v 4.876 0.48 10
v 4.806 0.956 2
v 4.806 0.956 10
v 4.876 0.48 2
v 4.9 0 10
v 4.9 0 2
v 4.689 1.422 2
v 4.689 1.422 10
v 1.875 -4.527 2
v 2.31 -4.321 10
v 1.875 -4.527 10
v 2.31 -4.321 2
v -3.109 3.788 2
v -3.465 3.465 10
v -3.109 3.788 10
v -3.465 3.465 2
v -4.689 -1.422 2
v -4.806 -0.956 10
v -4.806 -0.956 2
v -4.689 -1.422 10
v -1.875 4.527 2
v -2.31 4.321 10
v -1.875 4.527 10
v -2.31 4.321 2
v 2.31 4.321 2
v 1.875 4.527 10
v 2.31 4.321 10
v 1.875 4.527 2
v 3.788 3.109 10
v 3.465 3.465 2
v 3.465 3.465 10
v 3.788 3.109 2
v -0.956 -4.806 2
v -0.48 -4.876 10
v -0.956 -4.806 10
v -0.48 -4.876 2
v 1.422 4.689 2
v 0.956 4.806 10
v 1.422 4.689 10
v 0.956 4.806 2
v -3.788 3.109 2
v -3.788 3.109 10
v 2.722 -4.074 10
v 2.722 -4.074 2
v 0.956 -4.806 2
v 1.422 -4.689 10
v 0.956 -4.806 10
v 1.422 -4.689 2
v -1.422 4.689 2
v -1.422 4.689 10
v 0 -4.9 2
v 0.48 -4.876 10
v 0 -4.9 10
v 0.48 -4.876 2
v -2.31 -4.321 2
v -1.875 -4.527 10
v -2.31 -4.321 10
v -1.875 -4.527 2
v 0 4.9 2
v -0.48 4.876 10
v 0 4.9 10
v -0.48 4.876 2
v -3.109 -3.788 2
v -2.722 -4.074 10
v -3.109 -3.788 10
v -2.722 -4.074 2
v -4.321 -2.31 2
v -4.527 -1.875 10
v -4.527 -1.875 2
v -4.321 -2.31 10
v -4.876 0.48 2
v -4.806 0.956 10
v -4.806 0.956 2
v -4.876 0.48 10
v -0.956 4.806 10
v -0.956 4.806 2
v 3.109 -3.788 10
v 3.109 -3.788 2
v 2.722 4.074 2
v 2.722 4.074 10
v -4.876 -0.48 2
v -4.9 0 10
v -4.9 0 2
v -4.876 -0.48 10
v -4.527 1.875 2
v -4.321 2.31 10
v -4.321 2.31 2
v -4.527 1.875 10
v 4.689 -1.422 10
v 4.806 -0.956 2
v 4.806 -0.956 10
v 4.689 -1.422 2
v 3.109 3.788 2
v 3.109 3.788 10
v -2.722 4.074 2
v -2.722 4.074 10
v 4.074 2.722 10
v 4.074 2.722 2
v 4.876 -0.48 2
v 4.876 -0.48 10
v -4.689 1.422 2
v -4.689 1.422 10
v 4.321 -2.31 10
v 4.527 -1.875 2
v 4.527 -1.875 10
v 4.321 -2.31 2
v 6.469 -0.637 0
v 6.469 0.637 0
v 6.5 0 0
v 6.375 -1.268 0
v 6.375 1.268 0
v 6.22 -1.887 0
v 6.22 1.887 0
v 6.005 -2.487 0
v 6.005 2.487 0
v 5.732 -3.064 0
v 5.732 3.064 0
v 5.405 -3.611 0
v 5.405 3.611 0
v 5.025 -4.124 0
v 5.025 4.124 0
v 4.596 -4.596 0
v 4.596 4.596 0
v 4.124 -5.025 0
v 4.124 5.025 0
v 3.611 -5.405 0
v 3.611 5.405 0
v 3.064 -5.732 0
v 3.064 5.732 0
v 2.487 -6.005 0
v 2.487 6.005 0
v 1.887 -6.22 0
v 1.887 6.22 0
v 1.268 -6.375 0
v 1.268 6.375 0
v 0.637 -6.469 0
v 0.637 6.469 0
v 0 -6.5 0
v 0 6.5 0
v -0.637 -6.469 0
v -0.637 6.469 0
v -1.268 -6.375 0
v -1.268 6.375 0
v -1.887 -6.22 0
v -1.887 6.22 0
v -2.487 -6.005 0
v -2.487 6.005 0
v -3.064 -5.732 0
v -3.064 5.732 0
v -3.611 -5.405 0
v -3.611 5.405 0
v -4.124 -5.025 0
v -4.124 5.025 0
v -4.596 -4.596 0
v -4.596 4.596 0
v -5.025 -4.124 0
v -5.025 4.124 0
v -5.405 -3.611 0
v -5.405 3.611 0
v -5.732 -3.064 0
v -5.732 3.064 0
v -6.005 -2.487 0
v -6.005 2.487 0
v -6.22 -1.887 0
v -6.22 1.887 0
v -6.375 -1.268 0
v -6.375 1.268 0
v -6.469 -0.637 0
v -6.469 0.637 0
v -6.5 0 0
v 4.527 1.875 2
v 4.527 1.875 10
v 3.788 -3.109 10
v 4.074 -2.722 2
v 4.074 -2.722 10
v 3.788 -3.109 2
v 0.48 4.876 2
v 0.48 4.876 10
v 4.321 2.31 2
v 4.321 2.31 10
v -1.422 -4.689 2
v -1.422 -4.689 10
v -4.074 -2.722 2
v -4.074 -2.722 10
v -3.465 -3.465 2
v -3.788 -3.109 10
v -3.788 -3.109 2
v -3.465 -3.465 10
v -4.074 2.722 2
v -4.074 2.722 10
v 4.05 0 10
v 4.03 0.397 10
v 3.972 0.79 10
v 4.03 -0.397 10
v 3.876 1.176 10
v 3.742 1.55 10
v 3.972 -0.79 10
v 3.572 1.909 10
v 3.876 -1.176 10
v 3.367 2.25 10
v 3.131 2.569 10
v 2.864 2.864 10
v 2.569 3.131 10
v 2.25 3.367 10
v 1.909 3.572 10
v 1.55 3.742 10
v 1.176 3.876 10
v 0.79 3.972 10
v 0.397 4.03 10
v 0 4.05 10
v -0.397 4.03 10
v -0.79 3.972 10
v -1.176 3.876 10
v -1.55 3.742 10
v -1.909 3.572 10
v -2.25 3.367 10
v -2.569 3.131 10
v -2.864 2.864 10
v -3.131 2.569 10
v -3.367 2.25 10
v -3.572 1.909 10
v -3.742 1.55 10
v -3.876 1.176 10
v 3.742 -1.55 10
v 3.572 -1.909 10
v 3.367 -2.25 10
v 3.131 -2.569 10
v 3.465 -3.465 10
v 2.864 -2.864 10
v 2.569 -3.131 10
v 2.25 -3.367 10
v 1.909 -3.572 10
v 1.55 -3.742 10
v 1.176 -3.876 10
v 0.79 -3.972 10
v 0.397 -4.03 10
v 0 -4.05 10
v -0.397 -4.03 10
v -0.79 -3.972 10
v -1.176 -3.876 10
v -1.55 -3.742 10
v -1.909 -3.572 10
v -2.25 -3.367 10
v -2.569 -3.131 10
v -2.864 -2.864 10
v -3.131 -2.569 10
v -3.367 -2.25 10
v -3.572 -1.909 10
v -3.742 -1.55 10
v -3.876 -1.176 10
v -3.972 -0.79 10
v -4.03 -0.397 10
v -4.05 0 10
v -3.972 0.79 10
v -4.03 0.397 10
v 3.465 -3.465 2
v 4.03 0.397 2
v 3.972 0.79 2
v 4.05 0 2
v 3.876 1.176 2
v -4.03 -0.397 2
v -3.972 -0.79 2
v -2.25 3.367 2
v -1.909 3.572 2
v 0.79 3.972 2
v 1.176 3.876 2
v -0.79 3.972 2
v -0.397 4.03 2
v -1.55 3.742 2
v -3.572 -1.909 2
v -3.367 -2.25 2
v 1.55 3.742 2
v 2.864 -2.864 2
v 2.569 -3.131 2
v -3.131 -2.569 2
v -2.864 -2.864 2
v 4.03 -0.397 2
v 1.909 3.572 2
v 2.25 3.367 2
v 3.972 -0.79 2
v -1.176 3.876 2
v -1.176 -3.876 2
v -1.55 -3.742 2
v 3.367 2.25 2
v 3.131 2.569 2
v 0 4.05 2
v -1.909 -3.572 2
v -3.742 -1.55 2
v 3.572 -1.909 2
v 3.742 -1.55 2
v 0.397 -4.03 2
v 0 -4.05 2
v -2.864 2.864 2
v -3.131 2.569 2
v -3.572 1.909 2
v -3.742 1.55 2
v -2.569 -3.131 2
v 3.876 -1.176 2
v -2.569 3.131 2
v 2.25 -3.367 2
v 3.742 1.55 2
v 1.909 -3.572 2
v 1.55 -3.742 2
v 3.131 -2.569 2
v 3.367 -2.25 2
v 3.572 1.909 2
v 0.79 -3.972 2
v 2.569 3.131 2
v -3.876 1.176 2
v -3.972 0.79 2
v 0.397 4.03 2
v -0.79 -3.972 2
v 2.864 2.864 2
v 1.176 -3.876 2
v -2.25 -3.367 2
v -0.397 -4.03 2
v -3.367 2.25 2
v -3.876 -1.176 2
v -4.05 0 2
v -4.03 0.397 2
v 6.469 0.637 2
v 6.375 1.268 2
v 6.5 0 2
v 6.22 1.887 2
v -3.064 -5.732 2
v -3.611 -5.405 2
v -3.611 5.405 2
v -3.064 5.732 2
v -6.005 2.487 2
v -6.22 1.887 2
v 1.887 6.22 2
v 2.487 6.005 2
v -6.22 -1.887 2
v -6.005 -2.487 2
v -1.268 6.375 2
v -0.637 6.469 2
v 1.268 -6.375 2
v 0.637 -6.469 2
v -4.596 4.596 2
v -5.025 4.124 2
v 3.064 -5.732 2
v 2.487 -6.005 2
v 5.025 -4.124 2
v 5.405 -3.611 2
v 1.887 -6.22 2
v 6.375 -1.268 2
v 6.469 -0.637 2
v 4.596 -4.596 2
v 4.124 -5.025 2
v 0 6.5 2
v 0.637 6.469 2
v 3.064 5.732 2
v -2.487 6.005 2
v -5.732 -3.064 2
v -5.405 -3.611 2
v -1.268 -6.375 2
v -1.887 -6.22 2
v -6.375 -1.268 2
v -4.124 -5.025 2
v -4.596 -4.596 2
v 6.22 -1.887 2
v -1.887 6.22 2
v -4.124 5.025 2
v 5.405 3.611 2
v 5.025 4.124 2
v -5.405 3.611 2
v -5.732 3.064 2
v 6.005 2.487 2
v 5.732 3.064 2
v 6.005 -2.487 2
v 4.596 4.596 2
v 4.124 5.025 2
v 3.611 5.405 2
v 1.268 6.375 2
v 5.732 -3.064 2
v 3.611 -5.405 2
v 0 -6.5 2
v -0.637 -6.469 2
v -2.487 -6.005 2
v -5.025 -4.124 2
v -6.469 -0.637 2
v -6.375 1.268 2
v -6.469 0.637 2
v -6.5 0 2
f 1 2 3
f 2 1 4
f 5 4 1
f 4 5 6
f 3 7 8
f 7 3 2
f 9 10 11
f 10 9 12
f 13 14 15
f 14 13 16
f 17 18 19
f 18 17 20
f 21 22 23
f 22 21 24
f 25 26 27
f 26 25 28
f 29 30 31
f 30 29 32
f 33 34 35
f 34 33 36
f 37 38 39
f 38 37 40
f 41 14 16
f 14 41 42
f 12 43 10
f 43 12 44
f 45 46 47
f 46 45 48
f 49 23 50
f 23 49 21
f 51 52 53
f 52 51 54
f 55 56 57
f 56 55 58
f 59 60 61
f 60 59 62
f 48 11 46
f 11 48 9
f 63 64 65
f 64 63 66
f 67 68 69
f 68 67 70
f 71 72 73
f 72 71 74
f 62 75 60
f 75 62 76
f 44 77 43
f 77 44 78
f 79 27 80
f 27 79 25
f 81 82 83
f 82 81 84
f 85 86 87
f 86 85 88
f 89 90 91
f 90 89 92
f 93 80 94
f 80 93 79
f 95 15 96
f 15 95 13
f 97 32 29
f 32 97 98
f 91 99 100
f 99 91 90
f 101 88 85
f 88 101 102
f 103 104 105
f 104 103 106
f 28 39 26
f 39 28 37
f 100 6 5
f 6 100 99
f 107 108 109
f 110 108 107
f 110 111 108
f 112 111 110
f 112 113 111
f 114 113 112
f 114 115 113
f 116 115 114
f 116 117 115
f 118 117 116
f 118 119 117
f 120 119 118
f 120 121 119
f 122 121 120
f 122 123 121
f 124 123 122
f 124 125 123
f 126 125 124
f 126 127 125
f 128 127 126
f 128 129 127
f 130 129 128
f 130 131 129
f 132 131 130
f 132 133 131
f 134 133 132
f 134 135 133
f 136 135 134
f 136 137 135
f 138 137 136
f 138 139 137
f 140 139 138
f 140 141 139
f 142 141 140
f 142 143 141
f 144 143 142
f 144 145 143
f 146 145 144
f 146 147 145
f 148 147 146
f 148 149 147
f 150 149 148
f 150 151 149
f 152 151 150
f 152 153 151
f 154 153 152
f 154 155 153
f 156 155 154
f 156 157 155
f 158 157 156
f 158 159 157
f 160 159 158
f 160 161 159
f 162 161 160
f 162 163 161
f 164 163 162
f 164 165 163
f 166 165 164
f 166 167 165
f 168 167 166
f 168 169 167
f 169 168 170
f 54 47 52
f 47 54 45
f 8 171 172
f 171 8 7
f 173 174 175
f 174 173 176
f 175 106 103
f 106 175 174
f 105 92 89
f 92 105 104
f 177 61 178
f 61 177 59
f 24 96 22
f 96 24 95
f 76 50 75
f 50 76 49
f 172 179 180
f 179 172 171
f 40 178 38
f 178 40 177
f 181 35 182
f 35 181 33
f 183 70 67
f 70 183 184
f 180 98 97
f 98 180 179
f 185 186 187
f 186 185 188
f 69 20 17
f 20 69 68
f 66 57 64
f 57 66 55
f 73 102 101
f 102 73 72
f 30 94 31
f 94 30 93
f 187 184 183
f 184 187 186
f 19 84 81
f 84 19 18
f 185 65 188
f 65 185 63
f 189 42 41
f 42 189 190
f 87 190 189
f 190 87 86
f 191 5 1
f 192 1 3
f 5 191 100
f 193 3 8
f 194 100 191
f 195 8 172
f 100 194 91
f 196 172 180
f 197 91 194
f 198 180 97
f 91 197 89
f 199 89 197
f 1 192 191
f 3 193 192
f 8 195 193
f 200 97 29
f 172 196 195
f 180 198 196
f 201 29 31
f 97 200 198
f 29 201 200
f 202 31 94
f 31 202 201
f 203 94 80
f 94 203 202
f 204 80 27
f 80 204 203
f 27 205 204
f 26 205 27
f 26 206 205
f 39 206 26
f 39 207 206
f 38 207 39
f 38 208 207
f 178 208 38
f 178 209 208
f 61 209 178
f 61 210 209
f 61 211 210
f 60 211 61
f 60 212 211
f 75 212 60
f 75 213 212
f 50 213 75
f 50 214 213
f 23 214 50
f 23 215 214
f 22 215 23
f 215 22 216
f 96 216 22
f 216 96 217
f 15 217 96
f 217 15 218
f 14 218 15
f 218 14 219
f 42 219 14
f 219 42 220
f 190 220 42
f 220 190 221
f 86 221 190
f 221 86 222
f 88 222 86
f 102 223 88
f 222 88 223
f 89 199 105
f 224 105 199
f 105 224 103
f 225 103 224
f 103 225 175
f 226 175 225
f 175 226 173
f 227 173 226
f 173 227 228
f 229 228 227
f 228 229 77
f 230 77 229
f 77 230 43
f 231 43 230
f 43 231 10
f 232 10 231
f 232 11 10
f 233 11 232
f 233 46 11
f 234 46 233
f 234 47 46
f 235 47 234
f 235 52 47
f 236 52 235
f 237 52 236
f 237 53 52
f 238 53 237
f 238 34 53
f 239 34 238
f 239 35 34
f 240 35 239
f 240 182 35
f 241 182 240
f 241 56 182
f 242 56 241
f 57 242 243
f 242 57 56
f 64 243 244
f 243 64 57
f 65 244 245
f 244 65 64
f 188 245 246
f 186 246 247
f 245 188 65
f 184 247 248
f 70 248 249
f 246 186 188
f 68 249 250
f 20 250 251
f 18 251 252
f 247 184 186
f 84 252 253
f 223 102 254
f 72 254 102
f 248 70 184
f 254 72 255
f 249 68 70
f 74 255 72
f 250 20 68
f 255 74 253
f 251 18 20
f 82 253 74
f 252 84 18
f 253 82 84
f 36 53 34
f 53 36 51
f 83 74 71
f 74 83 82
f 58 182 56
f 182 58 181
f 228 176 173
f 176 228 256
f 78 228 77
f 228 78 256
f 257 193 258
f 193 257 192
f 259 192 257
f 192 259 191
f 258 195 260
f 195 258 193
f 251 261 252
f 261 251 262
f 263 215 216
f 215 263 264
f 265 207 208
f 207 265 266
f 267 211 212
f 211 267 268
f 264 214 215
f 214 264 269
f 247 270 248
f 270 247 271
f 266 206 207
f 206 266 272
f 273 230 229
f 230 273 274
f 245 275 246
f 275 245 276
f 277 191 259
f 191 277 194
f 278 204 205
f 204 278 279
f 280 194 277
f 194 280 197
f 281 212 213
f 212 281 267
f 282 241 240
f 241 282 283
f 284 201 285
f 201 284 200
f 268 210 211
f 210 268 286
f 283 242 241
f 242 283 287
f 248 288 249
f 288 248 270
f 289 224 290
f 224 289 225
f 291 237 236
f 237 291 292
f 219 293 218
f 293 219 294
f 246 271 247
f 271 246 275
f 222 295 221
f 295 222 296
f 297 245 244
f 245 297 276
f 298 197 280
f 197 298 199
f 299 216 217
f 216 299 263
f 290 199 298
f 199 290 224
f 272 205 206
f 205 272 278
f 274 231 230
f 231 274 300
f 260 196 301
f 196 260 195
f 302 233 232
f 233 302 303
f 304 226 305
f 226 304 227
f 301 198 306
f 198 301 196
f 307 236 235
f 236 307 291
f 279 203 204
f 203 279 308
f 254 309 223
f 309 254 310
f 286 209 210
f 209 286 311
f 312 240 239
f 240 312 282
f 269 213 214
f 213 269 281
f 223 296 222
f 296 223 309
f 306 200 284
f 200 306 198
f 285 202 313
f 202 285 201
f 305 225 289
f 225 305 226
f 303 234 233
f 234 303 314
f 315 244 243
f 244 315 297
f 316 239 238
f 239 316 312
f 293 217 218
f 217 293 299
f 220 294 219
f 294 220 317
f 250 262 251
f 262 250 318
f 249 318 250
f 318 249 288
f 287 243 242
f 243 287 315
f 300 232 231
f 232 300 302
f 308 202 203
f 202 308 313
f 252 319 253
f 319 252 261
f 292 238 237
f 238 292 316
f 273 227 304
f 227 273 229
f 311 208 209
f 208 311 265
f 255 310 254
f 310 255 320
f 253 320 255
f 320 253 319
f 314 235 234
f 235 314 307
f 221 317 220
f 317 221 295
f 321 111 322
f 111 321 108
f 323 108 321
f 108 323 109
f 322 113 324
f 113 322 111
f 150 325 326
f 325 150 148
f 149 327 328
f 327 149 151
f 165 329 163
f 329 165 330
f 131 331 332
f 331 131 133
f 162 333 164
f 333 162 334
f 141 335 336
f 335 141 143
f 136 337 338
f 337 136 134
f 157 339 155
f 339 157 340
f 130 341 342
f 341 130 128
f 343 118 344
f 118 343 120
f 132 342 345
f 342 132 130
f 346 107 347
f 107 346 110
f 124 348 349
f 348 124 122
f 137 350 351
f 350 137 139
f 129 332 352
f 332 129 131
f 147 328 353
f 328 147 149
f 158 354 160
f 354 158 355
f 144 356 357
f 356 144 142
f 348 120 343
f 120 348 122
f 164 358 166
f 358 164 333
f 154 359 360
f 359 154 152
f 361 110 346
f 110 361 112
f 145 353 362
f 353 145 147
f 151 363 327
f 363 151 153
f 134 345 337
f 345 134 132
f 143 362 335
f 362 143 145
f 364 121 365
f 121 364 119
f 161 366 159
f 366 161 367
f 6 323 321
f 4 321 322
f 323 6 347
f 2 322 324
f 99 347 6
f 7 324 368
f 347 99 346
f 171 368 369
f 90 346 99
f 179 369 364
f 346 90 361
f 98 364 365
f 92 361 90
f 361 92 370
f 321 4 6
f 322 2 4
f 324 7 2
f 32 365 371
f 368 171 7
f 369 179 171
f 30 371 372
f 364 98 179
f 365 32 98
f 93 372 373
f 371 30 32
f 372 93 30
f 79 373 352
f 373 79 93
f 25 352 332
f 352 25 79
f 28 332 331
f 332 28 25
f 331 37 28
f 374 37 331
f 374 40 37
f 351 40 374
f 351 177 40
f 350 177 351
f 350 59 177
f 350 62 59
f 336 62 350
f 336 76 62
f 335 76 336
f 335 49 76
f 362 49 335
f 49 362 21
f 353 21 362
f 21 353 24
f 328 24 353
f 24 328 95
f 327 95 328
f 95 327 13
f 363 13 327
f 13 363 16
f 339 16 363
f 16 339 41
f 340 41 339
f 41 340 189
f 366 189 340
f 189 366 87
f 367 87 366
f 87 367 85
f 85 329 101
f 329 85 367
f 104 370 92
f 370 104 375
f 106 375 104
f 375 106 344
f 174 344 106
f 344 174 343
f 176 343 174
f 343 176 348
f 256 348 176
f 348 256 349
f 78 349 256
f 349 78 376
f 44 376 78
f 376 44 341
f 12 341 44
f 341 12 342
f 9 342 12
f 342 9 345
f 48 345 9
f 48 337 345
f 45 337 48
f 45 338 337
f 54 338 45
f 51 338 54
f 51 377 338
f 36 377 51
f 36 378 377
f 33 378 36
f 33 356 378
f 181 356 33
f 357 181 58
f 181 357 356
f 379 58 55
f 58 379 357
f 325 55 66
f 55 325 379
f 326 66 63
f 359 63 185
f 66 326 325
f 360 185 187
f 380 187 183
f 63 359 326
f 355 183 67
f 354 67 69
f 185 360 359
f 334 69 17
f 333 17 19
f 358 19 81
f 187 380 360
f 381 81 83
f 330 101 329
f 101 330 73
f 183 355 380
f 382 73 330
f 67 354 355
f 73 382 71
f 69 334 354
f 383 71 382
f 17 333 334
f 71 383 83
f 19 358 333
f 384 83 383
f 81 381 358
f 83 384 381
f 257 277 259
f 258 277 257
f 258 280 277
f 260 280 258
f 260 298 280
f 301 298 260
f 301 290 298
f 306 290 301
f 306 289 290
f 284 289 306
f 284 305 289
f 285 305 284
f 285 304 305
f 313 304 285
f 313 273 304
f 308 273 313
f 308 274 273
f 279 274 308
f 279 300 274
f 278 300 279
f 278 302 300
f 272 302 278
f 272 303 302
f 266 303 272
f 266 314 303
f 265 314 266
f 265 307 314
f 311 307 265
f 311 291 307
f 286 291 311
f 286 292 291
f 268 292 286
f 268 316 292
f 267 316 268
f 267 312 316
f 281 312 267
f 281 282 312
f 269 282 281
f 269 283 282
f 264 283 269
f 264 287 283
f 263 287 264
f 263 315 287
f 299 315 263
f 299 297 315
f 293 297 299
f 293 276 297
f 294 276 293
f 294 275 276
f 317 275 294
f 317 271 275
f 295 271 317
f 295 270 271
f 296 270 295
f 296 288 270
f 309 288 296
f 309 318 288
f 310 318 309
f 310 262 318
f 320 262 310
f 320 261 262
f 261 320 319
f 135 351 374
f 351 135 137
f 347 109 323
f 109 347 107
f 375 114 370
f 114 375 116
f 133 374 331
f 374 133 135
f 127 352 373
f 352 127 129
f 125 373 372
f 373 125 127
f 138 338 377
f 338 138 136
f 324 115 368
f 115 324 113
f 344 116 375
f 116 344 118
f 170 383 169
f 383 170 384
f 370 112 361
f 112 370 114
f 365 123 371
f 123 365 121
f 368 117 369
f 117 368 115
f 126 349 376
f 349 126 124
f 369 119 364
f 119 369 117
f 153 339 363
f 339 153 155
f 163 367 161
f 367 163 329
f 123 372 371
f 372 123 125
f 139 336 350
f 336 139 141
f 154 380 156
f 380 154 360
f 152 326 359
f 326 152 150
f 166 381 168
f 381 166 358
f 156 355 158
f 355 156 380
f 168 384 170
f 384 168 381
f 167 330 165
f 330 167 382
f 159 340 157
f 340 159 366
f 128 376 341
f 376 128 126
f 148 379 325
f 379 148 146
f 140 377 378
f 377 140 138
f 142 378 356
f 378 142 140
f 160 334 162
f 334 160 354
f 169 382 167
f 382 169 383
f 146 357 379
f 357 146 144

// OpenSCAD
placekZewn = 13;
placekWys = 2;
tulejaZewn = 9.8;
tulejaWewn = 8.1;
tulejaWys = 10;


$fn=64;
//$fn=15;

     
translate([0,0,placekWys/2])
{
    cylinder(h=placekWys, r=placekZewn/2, center=true);
}

translate([0,0,tulejaWys/2])
{
    difference()
    {
        cylinder(h=tulejaWys, r=tulejaZewn/2, center=true);
        cylinder(h=tulejaWys, r=tulejaWewn/2, center=true);
    }
}
        
        
